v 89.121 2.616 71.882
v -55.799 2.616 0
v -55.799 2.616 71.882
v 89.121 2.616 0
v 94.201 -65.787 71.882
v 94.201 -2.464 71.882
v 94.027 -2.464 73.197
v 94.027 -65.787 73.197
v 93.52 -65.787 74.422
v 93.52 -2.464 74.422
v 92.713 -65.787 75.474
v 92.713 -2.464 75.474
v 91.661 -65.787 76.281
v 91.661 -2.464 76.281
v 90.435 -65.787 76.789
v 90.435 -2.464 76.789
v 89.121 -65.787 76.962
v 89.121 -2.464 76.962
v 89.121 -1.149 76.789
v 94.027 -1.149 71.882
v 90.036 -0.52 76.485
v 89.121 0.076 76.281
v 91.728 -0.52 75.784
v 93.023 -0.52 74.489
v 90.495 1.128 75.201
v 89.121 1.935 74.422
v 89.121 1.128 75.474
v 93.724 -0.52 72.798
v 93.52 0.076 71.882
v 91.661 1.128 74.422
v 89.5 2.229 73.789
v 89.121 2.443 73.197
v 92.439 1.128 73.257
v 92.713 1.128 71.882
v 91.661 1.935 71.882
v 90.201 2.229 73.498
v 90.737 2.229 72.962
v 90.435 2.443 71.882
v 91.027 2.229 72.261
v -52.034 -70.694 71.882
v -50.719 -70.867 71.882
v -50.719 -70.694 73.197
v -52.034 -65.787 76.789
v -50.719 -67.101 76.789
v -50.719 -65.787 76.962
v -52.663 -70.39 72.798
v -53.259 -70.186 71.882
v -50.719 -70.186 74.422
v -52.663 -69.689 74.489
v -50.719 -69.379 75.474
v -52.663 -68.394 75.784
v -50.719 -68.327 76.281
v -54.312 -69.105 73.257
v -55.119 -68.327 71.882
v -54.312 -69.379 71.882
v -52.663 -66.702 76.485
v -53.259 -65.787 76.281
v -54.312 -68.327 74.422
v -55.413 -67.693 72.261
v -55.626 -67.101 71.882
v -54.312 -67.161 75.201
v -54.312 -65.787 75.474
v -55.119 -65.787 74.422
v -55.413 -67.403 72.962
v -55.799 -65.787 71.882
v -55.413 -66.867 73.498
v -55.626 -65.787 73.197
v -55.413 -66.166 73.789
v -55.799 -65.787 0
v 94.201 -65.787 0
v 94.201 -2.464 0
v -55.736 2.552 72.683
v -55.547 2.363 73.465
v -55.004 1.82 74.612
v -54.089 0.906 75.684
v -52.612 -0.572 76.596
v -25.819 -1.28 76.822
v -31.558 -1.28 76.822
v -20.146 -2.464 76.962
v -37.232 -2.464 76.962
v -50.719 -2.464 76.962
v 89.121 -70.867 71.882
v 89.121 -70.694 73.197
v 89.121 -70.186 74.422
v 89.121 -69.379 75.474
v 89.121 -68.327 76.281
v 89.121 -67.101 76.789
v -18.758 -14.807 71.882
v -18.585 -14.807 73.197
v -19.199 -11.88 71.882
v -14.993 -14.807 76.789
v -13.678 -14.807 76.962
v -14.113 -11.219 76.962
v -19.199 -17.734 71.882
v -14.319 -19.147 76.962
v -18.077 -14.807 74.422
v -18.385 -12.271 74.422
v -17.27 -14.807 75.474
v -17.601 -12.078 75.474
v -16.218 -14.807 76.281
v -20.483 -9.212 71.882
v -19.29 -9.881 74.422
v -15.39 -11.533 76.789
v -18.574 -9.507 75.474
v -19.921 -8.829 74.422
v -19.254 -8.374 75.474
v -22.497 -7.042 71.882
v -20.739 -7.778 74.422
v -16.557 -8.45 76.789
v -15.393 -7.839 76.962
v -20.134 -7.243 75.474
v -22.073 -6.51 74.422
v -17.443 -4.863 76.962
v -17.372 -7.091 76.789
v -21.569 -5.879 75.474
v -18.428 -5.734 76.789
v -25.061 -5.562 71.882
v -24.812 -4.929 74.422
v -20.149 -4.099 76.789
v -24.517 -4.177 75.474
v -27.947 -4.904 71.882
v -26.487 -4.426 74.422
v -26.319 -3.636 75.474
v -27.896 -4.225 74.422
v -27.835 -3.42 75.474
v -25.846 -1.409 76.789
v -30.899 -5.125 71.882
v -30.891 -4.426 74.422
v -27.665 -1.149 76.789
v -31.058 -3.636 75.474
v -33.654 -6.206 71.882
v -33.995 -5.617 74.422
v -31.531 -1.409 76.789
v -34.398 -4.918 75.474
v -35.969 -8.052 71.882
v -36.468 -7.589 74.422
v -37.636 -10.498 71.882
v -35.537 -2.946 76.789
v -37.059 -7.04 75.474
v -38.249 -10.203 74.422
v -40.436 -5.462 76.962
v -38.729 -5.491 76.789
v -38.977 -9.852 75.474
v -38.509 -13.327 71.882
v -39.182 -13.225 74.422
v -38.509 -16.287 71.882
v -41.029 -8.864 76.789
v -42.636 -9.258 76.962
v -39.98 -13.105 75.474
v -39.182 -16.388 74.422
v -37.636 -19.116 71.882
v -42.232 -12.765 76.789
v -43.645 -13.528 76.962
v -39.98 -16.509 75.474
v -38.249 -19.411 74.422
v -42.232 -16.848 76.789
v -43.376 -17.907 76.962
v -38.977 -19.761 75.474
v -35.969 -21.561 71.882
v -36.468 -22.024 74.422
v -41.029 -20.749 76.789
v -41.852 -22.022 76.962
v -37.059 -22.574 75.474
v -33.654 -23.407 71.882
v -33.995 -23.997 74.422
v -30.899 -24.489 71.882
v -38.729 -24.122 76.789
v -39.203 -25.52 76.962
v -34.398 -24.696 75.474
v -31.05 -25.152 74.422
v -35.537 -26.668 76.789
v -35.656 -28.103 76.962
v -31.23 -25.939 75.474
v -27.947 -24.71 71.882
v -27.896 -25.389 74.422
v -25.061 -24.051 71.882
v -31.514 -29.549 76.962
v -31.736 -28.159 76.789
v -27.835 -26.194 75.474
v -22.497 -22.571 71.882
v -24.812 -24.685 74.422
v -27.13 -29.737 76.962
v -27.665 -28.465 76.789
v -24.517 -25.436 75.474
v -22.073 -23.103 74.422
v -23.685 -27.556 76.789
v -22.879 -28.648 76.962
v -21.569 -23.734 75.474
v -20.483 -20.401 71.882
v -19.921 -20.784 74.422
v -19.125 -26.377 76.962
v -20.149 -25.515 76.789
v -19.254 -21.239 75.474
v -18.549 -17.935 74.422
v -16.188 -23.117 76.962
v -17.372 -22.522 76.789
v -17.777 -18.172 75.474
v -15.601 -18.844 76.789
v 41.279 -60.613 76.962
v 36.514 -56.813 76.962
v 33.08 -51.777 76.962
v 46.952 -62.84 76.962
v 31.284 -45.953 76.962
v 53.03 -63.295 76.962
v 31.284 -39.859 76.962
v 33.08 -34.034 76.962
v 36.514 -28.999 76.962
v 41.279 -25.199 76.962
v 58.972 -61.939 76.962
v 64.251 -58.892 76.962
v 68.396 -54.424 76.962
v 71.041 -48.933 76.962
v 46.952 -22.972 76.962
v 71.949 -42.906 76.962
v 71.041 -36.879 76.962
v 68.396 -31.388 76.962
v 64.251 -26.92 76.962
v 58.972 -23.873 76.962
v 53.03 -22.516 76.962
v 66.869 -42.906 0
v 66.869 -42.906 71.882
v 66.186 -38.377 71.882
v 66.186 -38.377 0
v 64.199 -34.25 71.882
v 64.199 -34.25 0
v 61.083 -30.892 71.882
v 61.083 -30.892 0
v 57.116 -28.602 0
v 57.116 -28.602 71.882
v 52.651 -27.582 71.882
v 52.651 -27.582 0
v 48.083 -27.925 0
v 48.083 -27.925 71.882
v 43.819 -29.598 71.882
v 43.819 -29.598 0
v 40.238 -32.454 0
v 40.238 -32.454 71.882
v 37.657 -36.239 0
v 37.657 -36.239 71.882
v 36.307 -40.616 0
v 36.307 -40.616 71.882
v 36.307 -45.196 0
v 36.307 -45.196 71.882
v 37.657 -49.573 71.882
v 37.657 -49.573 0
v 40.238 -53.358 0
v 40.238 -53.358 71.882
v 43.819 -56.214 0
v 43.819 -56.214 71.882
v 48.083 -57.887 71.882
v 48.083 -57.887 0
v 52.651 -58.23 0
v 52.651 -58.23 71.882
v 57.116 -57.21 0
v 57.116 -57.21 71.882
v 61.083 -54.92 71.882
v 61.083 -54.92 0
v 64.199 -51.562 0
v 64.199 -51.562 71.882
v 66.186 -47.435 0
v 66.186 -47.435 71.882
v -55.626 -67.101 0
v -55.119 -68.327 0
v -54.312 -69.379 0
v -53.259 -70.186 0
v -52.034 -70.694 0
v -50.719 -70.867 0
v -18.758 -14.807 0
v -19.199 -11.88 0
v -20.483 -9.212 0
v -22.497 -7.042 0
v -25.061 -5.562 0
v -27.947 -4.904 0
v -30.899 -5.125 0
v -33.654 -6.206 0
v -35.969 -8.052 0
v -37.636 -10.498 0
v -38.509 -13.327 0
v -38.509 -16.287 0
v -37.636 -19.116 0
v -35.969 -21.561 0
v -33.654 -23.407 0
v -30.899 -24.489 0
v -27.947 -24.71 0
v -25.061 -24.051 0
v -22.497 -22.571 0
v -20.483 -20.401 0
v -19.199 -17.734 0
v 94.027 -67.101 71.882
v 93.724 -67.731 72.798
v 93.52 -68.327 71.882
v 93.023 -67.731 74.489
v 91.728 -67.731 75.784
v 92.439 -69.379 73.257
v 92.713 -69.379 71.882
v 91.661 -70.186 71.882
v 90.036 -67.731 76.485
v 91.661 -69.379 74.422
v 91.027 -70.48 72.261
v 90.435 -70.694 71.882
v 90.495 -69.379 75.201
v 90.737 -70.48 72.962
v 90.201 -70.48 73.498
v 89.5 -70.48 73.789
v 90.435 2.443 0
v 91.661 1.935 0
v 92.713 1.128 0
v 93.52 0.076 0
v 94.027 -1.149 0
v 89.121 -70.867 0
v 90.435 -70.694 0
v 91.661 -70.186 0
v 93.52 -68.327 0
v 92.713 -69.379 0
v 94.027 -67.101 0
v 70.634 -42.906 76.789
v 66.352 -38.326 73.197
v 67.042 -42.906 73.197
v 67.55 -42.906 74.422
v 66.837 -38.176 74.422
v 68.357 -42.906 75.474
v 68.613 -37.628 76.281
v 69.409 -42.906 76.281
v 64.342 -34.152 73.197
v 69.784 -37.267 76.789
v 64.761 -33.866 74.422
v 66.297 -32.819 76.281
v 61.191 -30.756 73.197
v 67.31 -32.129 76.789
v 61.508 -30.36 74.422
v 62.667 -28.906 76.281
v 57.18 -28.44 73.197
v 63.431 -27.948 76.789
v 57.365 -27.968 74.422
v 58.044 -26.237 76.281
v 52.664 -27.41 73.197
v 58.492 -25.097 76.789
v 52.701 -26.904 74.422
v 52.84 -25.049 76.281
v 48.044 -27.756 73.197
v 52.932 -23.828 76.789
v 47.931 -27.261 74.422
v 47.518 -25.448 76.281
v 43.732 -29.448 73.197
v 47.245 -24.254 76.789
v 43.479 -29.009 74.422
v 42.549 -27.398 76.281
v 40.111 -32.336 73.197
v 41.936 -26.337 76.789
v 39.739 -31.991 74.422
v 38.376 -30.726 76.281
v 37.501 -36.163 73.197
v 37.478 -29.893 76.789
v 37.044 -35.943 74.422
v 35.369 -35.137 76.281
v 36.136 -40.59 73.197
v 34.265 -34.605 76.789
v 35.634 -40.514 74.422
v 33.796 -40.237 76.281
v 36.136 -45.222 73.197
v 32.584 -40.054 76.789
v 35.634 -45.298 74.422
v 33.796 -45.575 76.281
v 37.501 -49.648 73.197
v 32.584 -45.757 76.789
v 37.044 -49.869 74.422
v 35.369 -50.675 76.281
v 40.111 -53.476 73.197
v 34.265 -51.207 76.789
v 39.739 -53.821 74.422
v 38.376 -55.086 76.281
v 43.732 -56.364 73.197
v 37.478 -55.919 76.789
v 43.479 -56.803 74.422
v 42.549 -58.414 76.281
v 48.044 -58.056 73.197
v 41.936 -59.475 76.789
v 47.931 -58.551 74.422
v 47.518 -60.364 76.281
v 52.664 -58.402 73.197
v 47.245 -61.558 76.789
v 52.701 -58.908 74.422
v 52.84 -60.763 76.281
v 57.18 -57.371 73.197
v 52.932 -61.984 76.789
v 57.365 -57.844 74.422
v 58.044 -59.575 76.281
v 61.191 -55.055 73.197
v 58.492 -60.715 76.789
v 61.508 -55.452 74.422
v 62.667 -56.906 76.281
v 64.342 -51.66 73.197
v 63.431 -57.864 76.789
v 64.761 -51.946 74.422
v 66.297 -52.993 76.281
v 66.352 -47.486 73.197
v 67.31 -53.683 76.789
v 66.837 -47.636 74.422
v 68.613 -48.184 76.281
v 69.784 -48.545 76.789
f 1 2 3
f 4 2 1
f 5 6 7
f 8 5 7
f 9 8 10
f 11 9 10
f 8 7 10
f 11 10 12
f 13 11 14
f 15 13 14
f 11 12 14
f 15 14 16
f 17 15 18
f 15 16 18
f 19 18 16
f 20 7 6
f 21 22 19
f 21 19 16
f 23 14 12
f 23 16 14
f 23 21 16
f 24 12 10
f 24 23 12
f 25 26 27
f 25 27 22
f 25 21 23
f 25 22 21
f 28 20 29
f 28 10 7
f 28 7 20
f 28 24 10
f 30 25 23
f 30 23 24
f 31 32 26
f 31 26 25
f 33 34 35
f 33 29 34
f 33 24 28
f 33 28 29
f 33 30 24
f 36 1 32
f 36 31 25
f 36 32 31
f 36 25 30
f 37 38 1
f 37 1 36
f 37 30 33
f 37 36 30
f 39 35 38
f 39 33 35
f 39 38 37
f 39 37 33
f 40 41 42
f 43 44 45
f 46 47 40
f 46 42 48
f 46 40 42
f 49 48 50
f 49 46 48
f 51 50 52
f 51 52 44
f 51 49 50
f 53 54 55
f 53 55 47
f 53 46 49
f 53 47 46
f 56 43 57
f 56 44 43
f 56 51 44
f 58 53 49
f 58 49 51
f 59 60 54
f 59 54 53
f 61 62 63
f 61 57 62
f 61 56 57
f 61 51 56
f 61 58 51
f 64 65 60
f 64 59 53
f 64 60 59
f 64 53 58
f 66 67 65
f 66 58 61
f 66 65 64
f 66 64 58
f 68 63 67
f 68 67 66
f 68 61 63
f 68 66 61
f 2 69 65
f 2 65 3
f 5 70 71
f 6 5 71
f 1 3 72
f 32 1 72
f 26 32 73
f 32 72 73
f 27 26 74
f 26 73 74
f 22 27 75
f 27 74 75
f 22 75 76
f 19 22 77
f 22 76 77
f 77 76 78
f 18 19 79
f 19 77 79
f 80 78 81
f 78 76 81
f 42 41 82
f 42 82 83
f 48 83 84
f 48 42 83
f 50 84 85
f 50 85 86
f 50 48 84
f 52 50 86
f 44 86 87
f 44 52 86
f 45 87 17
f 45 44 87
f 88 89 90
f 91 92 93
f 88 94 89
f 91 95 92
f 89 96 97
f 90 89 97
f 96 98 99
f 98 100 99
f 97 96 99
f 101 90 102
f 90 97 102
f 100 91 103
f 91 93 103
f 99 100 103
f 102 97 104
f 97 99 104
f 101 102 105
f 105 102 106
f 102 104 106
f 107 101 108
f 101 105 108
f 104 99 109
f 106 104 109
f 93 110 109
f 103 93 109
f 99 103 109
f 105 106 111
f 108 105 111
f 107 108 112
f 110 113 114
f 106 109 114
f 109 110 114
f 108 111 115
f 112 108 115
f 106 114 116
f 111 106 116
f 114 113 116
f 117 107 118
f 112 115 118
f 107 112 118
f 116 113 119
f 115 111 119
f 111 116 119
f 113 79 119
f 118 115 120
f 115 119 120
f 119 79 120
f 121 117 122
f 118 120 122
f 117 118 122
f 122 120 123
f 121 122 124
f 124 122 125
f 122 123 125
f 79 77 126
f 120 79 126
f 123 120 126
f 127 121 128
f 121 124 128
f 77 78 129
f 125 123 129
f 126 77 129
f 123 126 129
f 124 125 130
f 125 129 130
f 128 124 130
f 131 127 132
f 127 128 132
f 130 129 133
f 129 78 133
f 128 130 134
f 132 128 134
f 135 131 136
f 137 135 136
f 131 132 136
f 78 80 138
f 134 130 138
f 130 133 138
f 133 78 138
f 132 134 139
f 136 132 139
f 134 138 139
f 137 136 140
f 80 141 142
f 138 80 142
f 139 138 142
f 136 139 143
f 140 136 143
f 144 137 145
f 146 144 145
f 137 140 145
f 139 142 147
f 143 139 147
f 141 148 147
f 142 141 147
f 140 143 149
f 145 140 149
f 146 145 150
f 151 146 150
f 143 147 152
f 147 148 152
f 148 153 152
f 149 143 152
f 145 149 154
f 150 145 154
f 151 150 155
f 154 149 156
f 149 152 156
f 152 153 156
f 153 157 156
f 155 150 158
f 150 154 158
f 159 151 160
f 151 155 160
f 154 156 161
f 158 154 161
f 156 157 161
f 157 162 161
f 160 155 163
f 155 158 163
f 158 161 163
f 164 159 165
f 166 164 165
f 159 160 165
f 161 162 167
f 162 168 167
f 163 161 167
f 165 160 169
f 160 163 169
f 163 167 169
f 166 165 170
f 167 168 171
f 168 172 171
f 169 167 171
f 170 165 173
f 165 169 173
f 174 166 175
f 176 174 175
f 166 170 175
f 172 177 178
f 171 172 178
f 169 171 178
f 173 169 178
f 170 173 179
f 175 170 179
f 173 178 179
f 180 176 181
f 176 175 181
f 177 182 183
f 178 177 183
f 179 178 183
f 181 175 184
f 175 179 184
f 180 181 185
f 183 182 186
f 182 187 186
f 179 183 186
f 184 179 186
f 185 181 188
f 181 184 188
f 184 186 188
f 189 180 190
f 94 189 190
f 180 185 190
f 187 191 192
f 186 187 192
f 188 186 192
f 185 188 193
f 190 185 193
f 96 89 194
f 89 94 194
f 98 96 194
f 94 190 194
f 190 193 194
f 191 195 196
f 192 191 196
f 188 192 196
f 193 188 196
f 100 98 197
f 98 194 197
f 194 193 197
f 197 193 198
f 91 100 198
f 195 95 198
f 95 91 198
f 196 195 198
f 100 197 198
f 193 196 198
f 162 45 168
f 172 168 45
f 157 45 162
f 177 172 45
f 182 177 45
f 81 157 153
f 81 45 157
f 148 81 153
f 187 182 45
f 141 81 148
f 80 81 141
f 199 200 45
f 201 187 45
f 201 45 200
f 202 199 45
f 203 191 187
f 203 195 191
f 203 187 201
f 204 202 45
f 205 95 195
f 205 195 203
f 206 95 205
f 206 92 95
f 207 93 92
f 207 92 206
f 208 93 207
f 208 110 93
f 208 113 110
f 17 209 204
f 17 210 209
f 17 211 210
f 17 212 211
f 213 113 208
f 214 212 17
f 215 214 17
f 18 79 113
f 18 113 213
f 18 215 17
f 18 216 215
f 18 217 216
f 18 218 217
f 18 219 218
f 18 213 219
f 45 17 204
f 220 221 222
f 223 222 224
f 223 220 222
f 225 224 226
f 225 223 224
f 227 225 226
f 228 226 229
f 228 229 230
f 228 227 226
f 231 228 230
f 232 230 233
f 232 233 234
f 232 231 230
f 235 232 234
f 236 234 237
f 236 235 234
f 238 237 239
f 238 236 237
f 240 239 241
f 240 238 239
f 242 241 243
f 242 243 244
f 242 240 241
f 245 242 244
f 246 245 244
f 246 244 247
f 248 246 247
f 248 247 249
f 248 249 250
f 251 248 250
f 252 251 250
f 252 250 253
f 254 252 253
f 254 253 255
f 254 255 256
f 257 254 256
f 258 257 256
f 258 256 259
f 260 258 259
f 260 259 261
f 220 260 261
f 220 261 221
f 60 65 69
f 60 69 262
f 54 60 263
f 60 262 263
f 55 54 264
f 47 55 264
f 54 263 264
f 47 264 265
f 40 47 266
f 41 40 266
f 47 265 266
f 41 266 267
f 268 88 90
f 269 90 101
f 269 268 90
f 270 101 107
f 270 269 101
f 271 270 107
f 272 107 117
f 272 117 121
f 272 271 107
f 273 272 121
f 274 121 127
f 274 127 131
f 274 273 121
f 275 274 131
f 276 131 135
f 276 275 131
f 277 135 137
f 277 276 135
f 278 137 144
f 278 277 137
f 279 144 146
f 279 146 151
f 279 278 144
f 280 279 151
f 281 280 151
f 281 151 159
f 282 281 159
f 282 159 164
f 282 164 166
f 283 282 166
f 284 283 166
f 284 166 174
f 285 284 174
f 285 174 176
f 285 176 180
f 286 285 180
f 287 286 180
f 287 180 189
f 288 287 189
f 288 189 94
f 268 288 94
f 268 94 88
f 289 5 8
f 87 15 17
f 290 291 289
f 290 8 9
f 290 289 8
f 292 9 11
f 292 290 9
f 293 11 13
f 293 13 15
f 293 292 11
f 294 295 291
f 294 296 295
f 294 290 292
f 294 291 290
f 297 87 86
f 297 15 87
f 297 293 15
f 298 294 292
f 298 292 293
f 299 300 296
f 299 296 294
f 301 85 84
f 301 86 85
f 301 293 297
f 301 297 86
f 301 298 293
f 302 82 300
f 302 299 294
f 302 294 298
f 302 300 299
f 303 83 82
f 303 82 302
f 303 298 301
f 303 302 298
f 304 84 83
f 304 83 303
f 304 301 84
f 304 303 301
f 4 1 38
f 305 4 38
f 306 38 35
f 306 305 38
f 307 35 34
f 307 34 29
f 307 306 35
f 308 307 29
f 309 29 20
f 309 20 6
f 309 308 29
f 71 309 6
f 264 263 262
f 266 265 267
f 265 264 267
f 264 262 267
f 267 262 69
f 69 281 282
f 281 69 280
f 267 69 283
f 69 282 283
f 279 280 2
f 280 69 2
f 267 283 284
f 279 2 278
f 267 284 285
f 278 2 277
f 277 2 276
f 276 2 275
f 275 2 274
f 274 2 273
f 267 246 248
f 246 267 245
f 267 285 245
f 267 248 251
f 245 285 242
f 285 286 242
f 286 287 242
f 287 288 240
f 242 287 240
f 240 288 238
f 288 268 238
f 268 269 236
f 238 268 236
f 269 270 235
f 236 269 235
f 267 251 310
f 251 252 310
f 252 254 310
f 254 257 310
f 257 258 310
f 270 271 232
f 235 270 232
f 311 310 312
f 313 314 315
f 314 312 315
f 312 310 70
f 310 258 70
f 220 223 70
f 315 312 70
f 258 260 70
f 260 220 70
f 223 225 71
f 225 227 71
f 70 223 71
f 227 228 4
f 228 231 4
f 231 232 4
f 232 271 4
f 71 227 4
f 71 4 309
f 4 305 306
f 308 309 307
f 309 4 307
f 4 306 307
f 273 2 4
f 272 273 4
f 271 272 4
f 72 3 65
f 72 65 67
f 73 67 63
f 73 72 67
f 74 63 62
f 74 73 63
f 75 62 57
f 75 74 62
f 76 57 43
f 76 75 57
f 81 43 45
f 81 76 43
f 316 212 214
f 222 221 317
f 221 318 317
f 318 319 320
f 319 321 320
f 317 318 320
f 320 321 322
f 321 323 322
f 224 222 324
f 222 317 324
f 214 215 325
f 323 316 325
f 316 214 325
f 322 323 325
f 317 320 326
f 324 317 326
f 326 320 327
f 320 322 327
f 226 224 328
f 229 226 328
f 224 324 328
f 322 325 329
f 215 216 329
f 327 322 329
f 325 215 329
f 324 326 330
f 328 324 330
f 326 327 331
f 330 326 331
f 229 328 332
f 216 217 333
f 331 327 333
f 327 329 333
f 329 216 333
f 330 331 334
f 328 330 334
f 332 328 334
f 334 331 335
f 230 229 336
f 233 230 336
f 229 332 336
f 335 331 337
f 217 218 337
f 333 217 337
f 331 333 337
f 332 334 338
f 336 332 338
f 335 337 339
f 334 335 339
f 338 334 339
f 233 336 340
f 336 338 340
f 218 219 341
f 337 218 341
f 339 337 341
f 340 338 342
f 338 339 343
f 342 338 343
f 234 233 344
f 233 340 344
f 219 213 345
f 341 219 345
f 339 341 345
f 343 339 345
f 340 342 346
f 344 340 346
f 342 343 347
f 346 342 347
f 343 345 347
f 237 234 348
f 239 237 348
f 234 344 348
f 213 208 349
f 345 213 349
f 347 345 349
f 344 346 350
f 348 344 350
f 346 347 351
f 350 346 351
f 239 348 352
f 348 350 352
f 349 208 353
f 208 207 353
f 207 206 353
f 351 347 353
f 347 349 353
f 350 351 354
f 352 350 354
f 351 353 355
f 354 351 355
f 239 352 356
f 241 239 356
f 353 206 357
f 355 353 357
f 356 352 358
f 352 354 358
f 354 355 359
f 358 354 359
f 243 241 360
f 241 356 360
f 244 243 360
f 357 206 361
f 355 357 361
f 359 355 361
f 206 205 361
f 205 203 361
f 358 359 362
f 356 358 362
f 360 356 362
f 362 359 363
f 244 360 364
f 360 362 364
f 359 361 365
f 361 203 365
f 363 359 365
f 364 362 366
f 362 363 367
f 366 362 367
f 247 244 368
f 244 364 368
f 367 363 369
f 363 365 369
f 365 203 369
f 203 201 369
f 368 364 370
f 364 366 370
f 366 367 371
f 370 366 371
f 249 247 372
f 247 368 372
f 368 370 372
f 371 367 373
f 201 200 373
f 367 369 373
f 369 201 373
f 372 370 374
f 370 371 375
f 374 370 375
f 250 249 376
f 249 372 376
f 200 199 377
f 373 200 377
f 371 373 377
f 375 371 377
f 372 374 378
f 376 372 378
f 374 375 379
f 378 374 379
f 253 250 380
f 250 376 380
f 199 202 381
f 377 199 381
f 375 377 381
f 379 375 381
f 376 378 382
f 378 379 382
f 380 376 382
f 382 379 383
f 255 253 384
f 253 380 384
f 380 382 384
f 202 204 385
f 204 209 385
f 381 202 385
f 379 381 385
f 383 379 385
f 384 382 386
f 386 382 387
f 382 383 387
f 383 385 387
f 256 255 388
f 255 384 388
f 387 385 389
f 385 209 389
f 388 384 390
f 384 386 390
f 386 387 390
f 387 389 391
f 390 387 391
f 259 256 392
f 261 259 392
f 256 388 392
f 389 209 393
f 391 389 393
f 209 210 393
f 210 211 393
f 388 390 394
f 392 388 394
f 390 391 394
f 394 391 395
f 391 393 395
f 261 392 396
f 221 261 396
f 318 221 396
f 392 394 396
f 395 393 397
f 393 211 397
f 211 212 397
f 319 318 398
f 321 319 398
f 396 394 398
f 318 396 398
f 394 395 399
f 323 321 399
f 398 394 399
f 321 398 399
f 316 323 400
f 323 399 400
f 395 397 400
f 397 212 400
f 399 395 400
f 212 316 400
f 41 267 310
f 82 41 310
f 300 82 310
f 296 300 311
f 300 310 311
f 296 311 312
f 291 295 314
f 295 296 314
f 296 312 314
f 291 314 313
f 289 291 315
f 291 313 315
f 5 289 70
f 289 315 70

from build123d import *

# Parameters (mm, degrees)
F0_W         = 150
F0_H         = 73.4827055006
F0_R         = 15.3666463422
F0_R_2       = 9.9309311283
F1_DEPTH     = 76.962
F2_T1_DEPTH  = 139.84
F2_T3_DEPTH  = 63.3227055006
F2_T5_DEPTH  = 157.62
F2_T7_DEPTH  = 81.1027055006
F2_T9_DEPTH  = 84.582
F2_S13_W     = 5.08
F2_S13_H     = 5.08
F2_T14_DEPTH = 5.08
F2_S19_W     = 5.08
F2_S19_H     = 5.08
F2_T20_DEPTH = 5.08
F2_S25_W     = 5.08
F2_S25_H     = 5.08
F2_T26_DEPTH = 5.08


# Not quite as in the source:
# - a fillet or chamfer that OpenCascade refuses, or shapes differently, is made with other operations: its cross-section is extruded or revolved along the edge and cut away or added


with BuildPart() as f1:
    # F0 (on Top) → F1 (new body)
    with BuildSketch(Plane.XY):
        with Locations((19.2005559802, -34.1252638027)):
            Rectangle(F0_W, F0_H)
        with Locations((51.502276212, -42.9059304297)):
            Circle(F0_R, mode=Mode.SUBTRACT)
        with Locations((-28.6887511611, -14.8067288101)):
            Circle(F0_R_2, mode=Mode.SUBTRACT)
    extrude(amount=F1_DEPTH)

    # F2: fillet of radius 5.08 on 9 edges, made by hand

    # F2_s2 → F2_t1 (cut)
    with BuildSketch(Plane.YZ.offset(-50.7194440198)):
        with BuildLine():
            ThreePointArc((-70.866616553, 71.882), (-69.3787190014, 75.4741024484), (-65.786616553, 76.962))
            Line((-65.786616553, 76.962), (-70.866616553, 76.962))
            Line((-70.866616553, 76.962), (-70.866616553, 71.882))
        make_face()
    extrude(amount=F2_T1_DEPTH, mode=Mode.SUBTRACT)

    # F2_s4 → F2_t3 (cut)
    with BuildSketch(Plane.XZ.offset(2.4639110524)):
        with BuildLine():
            ThreePointArc((94.2005559802, 71.882), (92.7126584286, 75.4741024484), (89.1205559802, 76.962))
            Line((89.1205559802, 76.962), (94.2005559802, 76.962))
            Line((94.2005559802, 76.962), (94.2005559802, 71.882))
        make_face()
    extrude(amount=F2_T3_DEPTH, mode=Mode.SUBTRACT)

    # F2_s6 → F2_t5 (cut)
    with BuildSketch(Plane.YZ.offset(-68.4994440198)):
        with BuildLine():
            ThreePointArc((2.6160889476, 71.882), (1.128191396, 75.4741024484), (-2.4639110524, 76.962))
            Line((-2.4639110524, 76.962), (2.6160889476, 76.962))
            Line((2.6160889476, 76.962), (2.6160889476, 71.882))
        make_face()
    extrude(amount=F2_T5_DEPTH, mode=Mode.SUBTRACT)

    # F2_s8 → F2_t7 (cut)
    with BuildSketch(Plane.XZ.offset(-15.3160889476)):
        with BuildLine():
            ThreePointArc((-55.7994440198, 71.882), (-54.3115464682, 75.4741024484), (-50.7194440198, 76.962))
            Line((-50.7194440198, 76.962), (-55.7994440198, 76.962))
            Line((-55.7994440198, 76.962), (-55.7994440198, 71.882))
        make_face()
    extrude(amount=F2_T7_DEPTH, mode=Mode.SUBTRACT)

    # F2_s10 → F2_t9 (cut)
    with BuildSketch(Plane.XY.offset(-12.7)):
        with BuildLine():
            ThreePointArc((89.1205559802, -70.866616553), (92.7126584286, -69.3787190014), (94.2005559802, -65.786616553))
            Line((94.2005559802, -65.786616553), (94.2005559802, -70.866616553))
            Line((94.2005559802, -70.866616553), (89.1205559802, -70.866616553))
        make_face()
        with BuildLine():
            ThreePointArc((89.1205559802, 2.6160889476), (92.7126584286, 1.128191396), (94.2005559802, -2.4639110524))
            Line((94.2005559802, -2.4639110524), (94.2005559802, 2.6160889476))
            Line((94.2005559802, 2.6160889476), (89.1205559802, 2.6160889476))
        make_face()
        with BuildLine():
            ThreePointArc((-55.7994440198, -65.786616553), (-54.3115464682, -69.3787190014), (-50.7194440198, -70.866616553))
            Line((-50.7194440198, -70.866616553), (-55.7994440198, -70.866616553))
            Line((-55.7994440198, -70.866616553), (-55.7994440198, -65.786616553))
        make_face()
    extrude(amount=F2_T9_DEPTH, mode=Mode.SUBTRACT)


with BuildPart() as f2_tool12:
    # F2_s13 → F2_t14 (new body)
    with BuildSketch(Plane.YZ.offset(-50.7194440198)):
        with Locations((-68.326616553, 74.422)):
            Rectangle(F2_S13_W, F2_S13_H)
    extrude(amount=-F2_T14_DEPTH)

    # F2_s15 → F2_t16 (revolve, cut)
    with BuildSketch(Plane(origin=(-50.7194440198, -65.786616553, 71.882), x_dir=(0, 0.7071067812, -0.7071067812), z_dir=(0, 0.7071067812, 0.7071067812))):
        with BuildLine():
            ThreePointArc((0, -5.08), (5.08, 0), (0, 5.08))
            Line((0, 5.08), (0, -5.08))
        make_face()
    revolve(axis=Axis((-50.7194440198, -65.786616553, 71.882), (-1, 0, 0)), mode=Mode.SUBTRACT)


with BuildPart() as f1_1:
    add(f1.part)

    # F2_t11: cut F2_tool12
    add(f2_tool12.part, mode=Mode.SUBTRACT)


with BuildPart() as f2_tool18:
    # F2_s19 → F2_t20 (new body)
    with BuildSketch(Plane.XZ.offset(65.786616553)):
        with Locations((91.6605559802, 74.422)):
            Rectangle(F2_S19_W, F2_S19_H)
    extrude(amount=F2_T20_DEPTH)

    # F2_s21 → F2_t22 (revolve, cut)
    with BuildSketch(Plane(origin=(89.1205559802, -65.786616553, 71.882), x_dir=(-0.7071067812, 0, -0.7071067812), z_dir=(-0.7071067812, 0, 0.7071067812))):
        with BuildLine():
            ThreePointArc((0, -5.08), (5.08, 0), (0, 5.08))
            Line((0, 5.08), (0, -5.08))
        make_face()
    revolve(axis=Axis((89.1205559802, -65.786616553, 71.882), (0, -1, 0)), mode=Mode.SUBTRACT)


with BuildPart() as f1_2:
    add(f1_1.part)

    # F2_t17: cut F2_tool18
    add(f2_tool18.part, mode=Mode.SUBTRACT)


with BuildPart() as f2_tool24:
    # F2_s25 → F2_t26 (new body)
    with BuildSketch(Plane.XZ.offset(2.4639110524)):
        with Locations((91.6605559802, 74.422)):
            Rectangle(F2_S25_W, F2_S25_H)
    extrude(amount=-F2_T26_DEPTH)

    # F2_s27 → F2_t28 (revolve, cut)
    with BuildSketch(Plane(origin=(89.1205559802, -2.4639110524, 71.882), x_dir=(-0.7071067812, 0, -0.7071067812), z_dir=(0.7071067812, 0, -0.7071067812))):
        with BuildLine():
            ThreePointArc((0, -5.08), (5.08, 0), (0, 5.08))
            Line((0, 5.08), (0, -5.08))
        make_face()
    revolve(axis=Axis((89.1205559802, -2.4639110524, 71.882), (0, 1, 0)), mode=Mode.SUBTRACT)


with BuildPart() as f1_3:
    add(f1_2.part)

    # F2_t23: cut F2_tool24
    add(f2_tool24.part, mode=Mode.SUBTRACT)

    # F2_s29 → F2_t30 (revolve, cut)
    with BuildSketch(Plane.XZ.offset(42.9059304297)):
        with BuildLine():
            ThreePointArc((66.8689225542, 71.882), (68.3568201058, 75.4741024484), (71.9489225542, 76.962))
            Line((71.9489225542, 76.962), (66.8689225542, 76.962))
            Line((66.8689225542, 76.962), (66.8689225542, 71.882))
        make_face()
    revolve(axis=Axis((51.502276212, -42.9059304297, 76.962), (0, 0, 1)), mode=Mode.SUBTRACT)

    # F2_s31 → F2_t32 (revolve, cut)
    with BuildSketch(Plane.XZ.offset(14.8067288101)):
        with BuildLine():
            ThreePointArc((-18.7578200328, 71.882), (-17.2699224813, 75.4741024484), (-13.6778200328, 76.962))
            Line((-13.6778200328, 76.962), (-18.7578200328, 76.962))
            Line((-18.7578200328, 76.962), (-18.7578200328, 71.882))
        make_face()
    revolve(axis=Axis((-28.6887511611, -14.8067288101, 76.962), (0, 0, 1)), mode=Mode.SUBTRACT)


solid = f1_3.part
